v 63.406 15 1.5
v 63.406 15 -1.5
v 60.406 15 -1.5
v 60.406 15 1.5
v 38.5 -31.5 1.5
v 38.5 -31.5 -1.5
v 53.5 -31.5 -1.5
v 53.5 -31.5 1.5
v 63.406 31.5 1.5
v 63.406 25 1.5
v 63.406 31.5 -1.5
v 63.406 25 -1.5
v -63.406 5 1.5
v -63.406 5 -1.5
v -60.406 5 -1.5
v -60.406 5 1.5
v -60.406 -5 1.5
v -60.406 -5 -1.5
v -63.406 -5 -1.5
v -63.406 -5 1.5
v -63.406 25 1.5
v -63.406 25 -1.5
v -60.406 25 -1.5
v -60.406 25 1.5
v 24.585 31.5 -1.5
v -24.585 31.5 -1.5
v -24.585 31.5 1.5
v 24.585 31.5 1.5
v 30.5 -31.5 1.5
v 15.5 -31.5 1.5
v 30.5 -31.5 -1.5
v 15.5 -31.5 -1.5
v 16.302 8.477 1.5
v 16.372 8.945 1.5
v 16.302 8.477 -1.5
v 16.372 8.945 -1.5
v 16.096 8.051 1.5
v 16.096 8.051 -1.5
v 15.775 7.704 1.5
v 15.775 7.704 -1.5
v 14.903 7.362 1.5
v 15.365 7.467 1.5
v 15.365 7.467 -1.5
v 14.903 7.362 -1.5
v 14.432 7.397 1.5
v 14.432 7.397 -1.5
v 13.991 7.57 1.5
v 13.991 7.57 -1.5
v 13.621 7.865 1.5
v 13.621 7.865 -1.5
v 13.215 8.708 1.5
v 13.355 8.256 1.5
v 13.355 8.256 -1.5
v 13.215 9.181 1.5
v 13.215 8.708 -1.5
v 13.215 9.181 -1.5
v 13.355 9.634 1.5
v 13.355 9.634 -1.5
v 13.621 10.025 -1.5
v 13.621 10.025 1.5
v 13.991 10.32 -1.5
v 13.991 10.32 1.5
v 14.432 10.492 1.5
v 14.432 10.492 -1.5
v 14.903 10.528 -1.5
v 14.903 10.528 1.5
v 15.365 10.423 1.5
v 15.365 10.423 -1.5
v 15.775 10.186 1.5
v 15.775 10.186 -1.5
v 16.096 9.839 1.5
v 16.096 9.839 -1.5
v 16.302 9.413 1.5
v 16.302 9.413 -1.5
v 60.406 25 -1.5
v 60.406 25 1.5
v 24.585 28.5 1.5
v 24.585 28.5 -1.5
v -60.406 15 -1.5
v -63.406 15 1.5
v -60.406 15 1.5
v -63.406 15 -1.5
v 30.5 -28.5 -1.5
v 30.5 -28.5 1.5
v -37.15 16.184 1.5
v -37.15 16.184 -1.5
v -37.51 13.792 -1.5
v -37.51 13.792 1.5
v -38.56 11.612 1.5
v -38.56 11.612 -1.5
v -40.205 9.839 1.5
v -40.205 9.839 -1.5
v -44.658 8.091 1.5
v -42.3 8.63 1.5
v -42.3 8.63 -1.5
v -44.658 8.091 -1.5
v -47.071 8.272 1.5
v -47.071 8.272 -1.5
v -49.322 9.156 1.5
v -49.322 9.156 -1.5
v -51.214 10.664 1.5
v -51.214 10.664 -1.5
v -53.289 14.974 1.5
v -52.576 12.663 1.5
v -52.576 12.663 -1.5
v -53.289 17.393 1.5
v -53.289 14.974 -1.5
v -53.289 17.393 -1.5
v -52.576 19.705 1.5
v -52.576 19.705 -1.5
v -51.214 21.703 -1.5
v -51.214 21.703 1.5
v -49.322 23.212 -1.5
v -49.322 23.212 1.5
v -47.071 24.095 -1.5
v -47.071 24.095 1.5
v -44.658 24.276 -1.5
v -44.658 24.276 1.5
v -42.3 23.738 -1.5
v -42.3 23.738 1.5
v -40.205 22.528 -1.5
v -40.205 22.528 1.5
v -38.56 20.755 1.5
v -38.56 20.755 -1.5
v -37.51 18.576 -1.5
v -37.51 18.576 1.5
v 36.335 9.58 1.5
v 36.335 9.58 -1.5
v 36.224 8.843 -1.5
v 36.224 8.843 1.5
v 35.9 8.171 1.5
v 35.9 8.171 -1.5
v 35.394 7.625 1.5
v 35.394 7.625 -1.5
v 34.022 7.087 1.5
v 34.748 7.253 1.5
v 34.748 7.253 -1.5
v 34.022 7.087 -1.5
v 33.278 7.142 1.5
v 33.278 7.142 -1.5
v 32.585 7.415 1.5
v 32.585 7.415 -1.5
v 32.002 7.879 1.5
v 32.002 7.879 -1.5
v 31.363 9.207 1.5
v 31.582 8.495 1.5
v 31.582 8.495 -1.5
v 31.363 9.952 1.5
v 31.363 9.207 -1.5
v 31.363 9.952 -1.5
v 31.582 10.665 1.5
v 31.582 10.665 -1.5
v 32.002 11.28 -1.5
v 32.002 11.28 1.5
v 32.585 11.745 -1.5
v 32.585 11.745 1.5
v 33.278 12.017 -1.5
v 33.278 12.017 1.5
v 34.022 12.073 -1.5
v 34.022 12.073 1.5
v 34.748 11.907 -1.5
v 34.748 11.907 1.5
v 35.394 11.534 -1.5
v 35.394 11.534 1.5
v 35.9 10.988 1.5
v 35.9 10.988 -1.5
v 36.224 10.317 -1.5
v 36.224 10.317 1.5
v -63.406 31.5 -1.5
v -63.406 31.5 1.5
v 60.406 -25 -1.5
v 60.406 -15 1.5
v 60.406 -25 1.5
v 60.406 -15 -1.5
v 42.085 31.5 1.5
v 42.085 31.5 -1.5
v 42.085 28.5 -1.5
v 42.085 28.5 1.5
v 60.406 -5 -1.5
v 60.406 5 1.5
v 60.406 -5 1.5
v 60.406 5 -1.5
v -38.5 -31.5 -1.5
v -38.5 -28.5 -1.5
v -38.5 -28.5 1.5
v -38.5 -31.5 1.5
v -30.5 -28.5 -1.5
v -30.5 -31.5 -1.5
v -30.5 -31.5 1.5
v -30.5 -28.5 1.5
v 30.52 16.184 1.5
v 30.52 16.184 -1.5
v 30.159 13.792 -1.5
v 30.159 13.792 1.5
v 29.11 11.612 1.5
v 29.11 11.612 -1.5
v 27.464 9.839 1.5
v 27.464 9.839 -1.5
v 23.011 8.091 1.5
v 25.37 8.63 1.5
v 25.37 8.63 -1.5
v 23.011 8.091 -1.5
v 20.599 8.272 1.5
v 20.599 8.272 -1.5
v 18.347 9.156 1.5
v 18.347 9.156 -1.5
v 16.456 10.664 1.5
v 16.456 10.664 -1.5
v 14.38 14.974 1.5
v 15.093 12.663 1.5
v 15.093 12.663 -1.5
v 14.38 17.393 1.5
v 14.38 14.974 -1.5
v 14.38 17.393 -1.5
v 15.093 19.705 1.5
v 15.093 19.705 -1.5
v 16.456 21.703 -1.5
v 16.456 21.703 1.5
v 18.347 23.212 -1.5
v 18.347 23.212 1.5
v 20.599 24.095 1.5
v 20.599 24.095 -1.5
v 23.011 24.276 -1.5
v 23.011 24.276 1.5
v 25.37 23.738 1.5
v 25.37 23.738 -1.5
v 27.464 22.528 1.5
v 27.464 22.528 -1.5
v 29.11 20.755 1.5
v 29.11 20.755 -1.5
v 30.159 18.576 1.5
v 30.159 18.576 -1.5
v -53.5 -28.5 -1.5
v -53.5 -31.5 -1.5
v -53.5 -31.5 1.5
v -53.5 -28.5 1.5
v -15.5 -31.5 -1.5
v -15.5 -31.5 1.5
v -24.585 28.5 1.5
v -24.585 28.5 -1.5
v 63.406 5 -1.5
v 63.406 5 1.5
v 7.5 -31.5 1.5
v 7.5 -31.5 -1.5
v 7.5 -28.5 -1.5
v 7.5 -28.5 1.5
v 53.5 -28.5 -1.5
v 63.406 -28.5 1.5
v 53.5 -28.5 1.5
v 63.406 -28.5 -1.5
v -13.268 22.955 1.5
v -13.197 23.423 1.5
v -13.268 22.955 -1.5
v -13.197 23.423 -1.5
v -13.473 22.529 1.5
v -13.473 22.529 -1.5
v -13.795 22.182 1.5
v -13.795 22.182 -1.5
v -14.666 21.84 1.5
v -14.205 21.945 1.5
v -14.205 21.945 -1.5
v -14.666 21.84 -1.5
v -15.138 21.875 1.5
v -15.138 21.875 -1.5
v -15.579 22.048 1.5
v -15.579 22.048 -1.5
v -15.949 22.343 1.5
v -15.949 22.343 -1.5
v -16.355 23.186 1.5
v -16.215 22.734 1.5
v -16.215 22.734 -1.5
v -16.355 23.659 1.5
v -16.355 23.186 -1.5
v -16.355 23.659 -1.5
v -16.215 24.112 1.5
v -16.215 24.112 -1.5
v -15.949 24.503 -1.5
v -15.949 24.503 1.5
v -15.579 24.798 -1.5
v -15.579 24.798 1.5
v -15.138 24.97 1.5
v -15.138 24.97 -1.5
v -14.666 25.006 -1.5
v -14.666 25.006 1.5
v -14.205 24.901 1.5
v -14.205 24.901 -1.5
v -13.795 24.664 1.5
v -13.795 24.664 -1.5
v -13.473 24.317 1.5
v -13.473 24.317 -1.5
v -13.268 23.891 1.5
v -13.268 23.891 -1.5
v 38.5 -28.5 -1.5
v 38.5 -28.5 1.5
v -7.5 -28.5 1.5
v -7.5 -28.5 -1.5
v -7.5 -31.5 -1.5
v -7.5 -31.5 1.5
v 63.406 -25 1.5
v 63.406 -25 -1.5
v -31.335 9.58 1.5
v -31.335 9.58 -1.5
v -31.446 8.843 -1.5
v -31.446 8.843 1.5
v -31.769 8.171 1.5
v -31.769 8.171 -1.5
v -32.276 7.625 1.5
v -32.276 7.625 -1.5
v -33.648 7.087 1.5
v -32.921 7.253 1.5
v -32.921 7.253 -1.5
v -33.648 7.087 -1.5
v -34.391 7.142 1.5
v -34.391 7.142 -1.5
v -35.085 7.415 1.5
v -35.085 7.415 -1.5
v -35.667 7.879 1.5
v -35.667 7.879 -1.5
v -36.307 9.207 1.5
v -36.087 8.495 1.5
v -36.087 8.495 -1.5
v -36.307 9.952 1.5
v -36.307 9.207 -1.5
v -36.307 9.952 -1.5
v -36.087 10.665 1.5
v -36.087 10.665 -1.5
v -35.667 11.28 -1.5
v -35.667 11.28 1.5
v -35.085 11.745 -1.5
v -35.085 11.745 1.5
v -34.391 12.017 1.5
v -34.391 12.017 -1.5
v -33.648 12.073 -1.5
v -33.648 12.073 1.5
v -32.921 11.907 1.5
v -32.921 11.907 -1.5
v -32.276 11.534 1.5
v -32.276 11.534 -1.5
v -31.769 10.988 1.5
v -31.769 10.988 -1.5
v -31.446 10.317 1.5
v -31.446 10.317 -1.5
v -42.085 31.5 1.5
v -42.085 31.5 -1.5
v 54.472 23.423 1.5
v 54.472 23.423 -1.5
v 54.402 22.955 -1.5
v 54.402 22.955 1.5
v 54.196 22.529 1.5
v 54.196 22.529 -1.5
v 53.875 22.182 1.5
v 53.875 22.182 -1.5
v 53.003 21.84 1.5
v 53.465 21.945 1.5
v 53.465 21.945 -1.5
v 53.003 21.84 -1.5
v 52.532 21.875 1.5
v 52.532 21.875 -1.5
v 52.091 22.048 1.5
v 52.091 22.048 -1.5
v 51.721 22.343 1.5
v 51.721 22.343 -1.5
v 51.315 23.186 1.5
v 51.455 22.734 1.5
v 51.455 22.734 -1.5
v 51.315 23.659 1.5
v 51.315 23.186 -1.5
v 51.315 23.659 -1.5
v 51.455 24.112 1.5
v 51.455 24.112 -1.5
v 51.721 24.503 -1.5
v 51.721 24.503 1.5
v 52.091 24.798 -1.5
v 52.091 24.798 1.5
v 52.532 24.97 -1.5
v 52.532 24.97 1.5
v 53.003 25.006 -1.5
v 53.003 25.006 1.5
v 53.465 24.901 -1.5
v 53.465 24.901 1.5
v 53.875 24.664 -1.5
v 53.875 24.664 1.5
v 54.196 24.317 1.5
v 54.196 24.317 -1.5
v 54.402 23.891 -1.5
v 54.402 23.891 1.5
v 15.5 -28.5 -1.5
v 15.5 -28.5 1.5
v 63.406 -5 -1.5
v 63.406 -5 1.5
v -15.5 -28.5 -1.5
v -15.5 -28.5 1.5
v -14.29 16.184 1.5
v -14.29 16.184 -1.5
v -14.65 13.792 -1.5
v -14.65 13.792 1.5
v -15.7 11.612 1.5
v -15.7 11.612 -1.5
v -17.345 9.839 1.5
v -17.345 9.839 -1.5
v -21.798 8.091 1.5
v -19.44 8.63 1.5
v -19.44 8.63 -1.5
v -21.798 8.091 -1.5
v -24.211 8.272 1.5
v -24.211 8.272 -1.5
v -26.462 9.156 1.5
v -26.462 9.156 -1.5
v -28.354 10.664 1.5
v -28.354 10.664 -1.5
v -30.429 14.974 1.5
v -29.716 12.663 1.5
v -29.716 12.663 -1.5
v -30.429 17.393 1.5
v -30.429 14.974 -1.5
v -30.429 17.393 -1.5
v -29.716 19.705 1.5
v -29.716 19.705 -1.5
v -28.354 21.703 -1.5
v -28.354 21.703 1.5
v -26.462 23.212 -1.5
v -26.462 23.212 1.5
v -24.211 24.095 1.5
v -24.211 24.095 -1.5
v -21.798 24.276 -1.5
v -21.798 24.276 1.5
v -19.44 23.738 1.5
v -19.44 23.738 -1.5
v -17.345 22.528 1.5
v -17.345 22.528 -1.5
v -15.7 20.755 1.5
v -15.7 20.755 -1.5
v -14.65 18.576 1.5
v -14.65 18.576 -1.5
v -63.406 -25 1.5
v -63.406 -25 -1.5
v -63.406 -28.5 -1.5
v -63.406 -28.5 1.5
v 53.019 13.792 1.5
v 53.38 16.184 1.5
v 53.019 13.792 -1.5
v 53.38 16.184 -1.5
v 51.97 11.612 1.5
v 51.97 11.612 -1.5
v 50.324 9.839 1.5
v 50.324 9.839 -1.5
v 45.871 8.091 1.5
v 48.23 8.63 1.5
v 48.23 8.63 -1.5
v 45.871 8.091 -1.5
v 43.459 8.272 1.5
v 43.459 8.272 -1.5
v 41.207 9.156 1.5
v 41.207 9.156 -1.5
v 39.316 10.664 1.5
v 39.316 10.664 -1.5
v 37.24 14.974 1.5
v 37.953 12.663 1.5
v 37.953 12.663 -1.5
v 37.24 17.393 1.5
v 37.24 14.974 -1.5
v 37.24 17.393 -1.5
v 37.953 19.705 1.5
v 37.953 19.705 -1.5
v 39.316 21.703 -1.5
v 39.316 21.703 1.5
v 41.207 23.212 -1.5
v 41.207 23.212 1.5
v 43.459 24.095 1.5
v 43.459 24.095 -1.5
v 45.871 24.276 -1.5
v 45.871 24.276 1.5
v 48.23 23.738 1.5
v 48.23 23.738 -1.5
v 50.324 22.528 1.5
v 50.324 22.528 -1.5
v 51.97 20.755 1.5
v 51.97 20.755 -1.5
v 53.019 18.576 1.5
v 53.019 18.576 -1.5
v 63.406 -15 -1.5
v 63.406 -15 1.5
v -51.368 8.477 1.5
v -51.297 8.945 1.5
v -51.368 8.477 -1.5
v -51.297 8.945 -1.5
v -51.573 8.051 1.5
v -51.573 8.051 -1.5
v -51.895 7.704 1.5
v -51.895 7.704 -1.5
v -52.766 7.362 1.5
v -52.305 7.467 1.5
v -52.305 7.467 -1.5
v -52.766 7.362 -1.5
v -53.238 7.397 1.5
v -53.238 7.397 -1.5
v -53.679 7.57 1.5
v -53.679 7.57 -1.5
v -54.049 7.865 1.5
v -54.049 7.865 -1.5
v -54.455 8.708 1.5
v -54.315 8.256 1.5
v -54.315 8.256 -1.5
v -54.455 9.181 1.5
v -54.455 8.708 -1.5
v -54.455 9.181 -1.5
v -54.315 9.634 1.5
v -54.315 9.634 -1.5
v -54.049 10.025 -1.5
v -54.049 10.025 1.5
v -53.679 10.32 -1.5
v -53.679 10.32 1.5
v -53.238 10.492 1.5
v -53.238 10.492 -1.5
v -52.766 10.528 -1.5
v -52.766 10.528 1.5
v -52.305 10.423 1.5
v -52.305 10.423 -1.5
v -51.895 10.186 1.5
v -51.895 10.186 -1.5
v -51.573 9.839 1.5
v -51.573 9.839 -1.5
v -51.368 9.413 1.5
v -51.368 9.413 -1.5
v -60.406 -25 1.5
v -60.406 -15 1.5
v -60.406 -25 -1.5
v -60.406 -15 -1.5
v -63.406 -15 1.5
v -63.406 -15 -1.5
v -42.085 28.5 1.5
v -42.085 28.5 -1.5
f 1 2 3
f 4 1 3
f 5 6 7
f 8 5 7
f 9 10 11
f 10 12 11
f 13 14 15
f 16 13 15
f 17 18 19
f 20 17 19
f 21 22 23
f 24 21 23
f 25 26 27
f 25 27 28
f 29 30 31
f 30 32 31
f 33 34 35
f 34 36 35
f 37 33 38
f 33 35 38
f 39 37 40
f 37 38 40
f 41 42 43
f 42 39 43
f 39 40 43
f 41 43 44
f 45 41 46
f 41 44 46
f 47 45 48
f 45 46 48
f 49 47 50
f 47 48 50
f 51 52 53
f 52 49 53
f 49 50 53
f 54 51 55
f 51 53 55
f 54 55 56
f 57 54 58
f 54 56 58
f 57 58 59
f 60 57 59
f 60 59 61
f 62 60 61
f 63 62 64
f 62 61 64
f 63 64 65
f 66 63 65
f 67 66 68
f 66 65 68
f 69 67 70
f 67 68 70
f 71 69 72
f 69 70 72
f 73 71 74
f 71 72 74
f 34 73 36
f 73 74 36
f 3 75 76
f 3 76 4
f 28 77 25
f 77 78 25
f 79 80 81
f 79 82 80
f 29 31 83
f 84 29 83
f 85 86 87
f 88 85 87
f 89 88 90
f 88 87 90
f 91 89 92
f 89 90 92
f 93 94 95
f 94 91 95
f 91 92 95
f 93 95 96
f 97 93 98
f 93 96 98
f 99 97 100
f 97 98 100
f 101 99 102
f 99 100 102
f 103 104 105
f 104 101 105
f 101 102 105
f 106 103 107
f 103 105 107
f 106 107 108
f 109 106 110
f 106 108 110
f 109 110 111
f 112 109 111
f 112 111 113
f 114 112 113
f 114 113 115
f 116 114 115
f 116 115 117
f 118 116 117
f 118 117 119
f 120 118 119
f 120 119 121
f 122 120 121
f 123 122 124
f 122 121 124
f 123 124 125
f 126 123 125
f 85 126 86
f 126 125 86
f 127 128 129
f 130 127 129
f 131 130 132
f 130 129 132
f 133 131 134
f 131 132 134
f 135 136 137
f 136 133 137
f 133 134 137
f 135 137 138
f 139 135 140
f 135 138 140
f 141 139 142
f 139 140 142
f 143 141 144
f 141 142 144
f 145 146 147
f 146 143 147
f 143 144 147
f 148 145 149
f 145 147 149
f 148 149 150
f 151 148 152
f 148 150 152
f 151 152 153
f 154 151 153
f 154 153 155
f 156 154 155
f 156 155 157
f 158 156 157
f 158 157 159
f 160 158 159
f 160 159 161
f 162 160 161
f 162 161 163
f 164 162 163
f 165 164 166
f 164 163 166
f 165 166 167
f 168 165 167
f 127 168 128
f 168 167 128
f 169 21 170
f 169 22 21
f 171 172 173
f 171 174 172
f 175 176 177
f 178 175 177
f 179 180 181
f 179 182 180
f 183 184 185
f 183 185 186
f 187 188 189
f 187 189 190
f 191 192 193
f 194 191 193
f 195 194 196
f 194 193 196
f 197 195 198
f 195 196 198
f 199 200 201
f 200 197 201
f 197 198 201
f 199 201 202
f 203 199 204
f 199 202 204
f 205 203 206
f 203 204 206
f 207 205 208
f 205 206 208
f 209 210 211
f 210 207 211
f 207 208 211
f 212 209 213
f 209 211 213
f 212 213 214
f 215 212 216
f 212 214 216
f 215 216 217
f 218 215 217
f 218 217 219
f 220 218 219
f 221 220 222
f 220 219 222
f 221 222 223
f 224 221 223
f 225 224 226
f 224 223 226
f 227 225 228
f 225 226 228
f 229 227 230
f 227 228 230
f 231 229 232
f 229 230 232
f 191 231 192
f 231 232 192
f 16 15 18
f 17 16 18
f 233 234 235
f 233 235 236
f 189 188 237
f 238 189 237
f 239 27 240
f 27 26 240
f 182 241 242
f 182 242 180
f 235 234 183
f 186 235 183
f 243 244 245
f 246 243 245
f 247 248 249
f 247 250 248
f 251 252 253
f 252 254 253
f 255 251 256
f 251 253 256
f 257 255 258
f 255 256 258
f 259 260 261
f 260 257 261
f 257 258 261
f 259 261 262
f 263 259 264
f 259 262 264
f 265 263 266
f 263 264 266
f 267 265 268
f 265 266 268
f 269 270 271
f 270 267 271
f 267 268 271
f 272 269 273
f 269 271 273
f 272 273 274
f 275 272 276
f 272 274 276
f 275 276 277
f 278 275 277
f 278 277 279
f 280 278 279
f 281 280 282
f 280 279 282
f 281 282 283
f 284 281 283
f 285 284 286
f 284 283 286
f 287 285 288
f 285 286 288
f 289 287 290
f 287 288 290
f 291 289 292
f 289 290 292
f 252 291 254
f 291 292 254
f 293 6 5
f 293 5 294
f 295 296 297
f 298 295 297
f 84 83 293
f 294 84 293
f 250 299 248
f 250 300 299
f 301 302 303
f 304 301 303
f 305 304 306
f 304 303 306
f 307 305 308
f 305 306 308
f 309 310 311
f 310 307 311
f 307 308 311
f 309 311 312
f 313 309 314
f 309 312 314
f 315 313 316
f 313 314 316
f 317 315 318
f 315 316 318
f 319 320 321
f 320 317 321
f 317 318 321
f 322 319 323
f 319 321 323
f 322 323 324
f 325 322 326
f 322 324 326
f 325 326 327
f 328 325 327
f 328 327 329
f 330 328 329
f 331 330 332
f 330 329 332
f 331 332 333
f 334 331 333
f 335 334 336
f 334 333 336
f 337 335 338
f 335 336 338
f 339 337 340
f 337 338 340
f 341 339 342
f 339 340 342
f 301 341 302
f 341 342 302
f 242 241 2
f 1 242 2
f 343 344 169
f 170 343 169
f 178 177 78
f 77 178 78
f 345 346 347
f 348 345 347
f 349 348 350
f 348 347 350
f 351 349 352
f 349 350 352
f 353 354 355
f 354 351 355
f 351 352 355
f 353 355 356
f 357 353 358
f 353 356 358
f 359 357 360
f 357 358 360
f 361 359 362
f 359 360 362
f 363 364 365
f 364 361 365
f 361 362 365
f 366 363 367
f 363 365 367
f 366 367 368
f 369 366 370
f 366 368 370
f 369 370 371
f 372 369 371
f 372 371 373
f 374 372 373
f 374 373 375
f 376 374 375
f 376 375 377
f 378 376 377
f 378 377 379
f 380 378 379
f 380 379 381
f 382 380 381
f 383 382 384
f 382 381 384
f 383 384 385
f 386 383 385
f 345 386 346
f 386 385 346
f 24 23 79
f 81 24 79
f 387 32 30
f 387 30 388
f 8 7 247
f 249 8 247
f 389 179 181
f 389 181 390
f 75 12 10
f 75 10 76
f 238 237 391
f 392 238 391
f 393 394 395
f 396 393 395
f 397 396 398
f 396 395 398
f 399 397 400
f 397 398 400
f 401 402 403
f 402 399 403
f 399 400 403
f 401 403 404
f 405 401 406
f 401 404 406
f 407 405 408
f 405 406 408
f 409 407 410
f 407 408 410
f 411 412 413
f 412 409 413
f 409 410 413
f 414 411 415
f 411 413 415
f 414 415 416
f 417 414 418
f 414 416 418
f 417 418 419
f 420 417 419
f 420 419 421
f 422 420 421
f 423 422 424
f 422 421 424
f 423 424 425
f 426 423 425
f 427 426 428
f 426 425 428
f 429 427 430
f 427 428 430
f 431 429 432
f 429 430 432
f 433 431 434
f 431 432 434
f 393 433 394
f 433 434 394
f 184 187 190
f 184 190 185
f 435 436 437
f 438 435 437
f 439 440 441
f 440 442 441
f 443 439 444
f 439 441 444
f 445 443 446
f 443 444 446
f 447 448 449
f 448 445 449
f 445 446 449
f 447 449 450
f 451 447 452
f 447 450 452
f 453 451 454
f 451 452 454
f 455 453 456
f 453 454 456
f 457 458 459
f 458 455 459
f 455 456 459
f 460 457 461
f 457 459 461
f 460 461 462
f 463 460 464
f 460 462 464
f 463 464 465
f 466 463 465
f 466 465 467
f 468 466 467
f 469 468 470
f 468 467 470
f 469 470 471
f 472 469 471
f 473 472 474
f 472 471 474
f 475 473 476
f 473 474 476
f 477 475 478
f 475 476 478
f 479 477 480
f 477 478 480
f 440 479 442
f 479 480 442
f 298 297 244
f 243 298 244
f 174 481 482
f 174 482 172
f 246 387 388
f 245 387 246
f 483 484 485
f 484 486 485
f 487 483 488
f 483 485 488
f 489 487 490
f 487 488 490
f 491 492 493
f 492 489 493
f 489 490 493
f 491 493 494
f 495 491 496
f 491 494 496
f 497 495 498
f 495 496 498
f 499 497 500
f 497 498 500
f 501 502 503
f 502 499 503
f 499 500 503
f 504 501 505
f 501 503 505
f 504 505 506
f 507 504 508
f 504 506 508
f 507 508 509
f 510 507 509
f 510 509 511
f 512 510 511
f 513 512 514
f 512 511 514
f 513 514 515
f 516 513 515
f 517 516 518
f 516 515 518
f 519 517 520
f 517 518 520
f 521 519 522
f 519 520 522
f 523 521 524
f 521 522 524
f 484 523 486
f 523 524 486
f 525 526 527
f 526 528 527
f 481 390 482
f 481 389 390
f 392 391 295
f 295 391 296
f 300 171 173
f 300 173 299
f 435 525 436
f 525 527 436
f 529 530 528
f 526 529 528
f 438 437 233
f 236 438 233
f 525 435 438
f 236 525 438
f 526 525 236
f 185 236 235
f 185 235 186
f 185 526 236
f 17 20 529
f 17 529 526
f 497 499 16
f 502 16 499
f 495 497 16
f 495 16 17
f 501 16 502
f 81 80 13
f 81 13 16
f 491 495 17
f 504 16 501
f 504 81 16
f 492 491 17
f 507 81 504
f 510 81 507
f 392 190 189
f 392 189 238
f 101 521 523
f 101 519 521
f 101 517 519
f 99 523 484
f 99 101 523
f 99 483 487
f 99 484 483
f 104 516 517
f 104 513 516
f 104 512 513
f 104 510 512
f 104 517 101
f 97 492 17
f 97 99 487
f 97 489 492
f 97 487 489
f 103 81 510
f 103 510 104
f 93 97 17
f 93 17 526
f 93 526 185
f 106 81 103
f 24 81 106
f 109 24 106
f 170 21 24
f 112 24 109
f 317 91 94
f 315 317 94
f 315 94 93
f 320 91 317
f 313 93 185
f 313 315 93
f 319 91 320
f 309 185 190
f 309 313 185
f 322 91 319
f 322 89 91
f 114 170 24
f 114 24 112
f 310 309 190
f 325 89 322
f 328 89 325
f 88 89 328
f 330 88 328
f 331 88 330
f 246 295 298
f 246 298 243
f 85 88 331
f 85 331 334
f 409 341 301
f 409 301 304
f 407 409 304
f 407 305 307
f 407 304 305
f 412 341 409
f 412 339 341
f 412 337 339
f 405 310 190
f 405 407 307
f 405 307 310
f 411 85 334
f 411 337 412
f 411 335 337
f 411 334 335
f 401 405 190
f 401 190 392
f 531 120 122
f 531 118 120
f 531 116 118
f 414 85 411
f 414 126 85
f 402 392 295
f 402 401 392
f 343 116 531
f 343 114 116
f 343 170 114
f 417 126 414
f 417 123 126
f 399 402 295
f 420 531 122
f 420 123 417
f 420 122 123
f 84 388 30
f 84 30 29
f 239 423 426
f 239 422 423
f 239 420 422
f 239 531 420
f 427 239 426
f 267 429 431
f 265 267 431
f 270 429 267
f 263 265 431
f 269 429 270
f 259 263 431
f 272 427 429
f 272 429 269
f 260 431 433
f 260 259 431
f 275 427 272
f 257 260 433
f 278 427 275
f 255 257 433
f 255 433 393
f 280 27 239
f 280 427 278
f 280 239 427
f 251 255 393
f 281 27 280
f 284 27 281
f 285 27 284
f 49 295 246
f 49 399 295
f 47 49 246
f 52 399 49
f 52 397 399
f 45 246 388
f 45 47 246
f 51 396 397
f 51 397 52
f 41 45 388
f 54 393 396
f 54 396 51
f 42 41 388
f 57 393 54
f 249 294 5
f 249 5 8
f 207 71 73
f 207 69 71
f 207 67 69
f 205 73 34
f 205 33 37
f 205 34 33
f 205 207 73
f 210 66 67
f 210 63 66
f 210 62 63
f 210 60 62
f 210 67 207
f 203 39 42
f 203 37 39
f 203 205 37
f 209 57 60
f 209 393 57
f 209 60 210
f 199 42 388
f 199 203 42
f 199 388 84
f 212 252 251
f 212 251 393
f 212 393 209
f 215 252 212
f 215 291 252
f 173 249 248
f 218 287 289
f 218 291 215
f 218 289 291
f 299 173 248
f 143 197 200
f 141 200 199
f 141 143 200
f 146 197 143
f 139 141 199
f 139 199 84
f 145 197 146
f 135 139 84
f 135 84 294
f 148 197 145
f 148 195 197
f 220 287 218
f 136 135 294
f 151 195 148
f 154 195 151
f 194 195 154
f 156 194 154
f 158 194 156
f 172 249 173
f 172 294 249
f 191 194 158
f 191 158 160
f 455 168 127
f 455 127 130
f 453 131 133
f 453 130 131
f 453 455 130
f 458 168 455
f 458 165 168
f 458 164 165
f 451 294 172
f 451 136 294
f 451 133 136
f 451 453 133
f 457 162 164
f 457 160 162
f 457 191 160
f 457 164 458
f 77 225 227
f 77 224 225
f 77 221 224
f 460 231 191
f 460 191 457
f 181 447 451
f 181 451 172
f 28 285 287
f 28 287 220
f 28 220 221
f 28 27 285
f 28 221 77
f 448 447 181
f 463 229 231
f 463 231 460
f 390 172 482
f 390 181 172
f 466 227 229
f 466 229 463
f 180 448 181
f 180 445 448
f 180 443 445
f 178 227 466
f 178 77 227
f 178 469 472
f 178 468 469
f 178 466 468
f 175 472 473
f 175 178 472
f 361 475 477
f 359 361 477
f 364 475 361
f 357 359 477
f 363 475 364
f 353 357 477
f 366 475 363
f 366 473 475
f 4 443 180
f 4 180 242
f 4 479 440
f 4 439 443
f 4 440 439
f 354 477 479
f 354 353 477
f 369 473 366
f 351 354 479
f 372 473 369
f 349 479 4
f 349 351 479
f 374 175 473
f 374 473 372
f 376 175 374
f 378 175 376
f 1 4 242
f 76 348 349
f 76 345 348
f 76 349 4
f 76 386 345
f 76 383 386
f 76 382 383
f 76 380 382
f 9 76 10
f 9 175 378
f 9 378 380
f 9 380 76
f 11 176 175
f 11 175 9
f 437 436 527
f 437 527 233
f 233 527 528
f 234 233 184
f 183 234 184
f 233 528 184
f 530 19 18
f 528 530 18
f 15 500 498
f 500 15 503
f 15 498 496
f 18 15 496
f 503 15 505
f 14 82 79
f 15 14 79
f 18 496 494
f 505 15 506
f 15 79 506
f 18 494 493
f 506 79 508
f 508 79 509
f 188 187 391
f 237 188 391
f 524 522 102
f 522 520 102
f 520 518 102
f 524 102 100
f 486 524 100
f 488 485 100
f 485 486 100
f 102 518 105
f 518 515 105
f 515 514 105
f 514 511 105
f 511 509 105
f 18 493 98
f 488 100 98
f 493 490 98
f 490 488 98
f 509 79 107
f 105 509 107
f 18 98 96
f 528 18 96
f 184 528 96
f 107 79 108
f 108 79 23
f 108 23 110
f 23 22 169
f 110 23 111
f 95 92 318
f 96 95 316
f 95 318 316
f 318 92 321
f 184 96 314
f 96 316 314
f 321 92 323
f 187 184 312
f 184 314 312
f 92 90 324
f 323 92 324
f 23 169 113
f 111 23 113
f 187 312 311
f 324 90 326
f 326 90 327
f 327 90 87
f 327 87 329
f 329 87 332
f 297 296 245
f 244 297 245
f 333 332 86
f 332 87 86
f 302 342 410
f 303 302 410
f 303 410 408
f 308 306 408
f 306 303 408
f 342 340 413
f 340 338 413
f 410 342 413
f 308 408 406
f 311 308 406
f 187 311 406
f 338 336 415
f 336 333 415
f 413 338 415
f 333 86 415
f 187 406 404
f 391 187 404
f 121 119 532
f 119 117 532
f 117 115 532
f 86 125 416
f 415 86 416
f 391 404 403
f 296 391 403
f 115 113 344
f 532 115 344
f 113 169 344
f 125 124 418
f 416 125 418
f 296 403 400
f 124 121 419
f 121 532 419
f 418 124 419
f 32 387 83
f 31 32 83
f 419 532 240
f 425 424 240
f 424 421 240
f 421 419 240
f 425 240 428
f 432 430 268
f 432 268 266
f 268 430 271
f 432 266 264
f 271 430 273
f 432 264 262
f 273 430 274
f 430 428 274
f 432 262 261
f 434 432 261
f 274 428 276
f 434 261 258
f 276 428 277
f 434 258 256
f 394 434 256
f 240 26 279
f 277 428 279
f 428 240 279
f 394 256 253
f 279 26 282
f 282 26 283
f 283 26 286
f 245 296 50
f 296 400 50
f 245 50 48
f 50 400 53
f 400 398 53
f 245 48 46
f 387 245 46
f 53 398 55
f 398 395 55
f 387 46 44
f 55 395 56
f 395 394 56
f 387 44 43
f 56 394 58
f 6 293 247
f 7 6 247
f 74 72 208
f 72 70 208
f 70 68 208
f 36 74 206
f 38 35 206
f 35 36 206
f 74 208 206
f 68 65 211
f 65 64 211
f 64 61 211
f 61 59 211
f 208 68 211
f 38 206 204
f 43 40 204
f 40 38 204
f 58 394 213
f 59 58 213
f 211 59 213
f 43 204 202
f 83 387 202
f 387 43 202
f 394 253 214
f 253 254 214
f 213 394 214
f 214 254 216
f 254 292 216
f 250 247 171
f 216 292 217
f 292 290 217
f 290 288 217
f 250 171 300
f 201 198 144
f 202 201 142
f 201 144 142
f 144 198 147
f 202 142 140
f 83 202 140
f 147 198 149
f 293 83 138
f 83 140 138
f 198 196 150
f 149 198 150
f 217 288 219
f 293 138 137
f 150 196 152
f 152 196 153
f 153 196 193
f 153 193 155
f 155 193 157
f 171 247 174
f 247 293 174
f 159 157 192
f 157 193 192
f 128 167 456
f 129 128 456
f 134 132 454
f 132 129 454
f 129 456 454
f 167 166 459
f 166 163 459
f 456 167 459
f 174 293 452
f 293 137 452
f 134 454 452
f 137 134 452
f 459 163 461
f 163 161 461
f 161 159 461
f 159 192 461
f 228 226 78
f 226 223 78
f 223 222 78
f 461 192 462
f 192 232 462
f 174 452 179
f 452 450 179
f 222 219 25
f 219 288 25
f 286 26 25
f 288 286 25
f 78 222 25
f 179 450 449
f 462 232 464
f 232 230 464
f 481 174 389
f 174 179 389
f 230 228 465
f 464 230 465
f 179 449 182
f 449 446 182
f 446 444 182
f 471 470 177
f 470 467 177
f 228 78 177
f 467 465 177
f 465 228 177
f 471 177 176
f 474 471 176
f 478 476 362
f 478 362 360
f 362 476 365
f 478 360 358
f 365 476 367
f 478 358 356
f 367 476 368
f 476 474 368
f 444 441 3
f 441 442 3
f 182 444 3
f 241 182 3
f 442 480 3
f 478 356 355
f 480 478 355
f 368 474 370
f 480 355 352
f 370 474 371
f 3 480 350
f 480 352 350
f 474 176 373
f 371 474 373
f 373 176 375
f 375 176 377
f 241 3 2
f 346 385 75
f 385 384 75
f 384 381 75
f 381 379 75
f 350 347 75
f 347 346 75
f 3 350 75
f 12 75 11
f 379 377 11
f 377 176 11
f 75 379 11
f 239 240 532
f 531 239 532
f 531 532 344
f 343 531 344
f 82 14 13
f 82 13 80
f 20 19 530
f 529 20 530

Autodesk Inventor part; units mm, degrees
ref_plane "YZ Plane" through (0, 0, 0) normal (1, 0, 0) x (0, 1, 0)
ref_plane "XZ Plane" through (0, 0, 0) normal (0, 1, 0) x (-1, 0, 0)
ref_plane "XY Plane" through (0, 0, 0) normal (0, 0, 1) x (1, 0, 0)
sketch "Sketch1" plane through (0, 0, 0) normal (0, 0, 1) x (1, 0, 0)
  line L0 (-42.0848, 28.5) -> (-42.0848, 31.5)
  line L1 (-24.5848, 28.5) -> (-42.0848, 28.5)
  line L2 (-24.5848, 31.5) -> (-24.5848, 28.5)
  line L3 (-24.5848, 31.5) -> (24.5848, 31.5)
  line L4 (24.5848, 28.5) -> (24.5848, 31.5)
  line L5 (42.0848, 28.5) -> (24.5848, 28.5)
  line L6 (42.0848, 31.5) -> (42.0848, 28.5)
  circle A0 centre (-45.2648, 16.1838) radius 8.115
  circle A1 centre (-22.4048, 16.1838) radius 8.115
  circle A2 centre (-14.7848, 23.4228) radius 1.5875
  circle A3 centre (-52.8848, 8.9448) radius 1.5875
  circle A4 centre (-33.8348, 9.5798) radius 2.5
  circle A5 centre (14.7848, 8.9448) radius 1.5875
  circle A6 centre (22.4048, 16.1838) radius 8.115
  circle A7 centre (33.8348, 9.5798) radius 2.5
  circle A8 centre (45.2648, 16.1838) radius 8.115
  circle A9 centre (52.8848, 23.4228) radius 1.5875
  line L7 (-60.406, 31.5) -> (60.406, -31.5) construction
  line L8 (60.406, 31.5) -> (-60.406, -31.5) construction
  line L9 (-7.5, -31.5) -> (7.5, -31.5)
  line L10 (7.5, -31.5) -> (7.5, -28.5)
  line L11 (-7.5, -28.5) -> (-7.5, -31.5)
  line L12 (-7.5, -31.5) -> (7.5, -28.5) construction
  line L13 (7.5, -31.5) -> (-7.5, -28.5) construction
  line L14 (0, 0) -> (13.8, 0) construction
  line L15 (13.8, 0) -> (13.8, 4) construction
  line L16 (-30.5, -31.5) -> (-15.5, -31.5)
  line L17 (-53.5, -31.5) -> (-38.5, -31.5)
  line L18 (15.5, -31.5) -> (30.5, -31.5)
  line L19 (-7.5, -31.5) -> (7.5, -31.5)
  line L20 (-30.5, -31.5) -> (-15.5, -31.5)
  line L21 (38.5, -31.5) -> (53.5, -31.5)
  line L22 (15.5, -31.5) -> (30.5, -31.5)
  line L23 (-7.5, -31.5) -> (7.5, -31.5)
  line L24 (-15.5, -31.5) -> (-15.5, -28.5)
  line L25 (-15.5, -28.5) -> (-7.5, -28.5)
  line L26 (-30.5, -31.5) -> (-30.5, -28.5)
  line L27 (-30.5, -28.5) -> (-38.5, -28.5)
  line L28 (-38.5, -28.5) -> (-38.5, -31.5)
  line L29 (-53.5, -31.5) -> (-53.5, -28.5)
  line L30 (15.5, -31.5) -> (15.5, -28.5)
  line L31 (15.5, -28.5) -> (7.5, -28.5)
  line L32 (30.5, -31.5) -> (30.5, -28.5)
  line L33 (30.5, -28.5) -> (38.5, -28.5)
  line L34 (38.5, -31.5) -> (38.5, -28.5)
  line L35 (53.5, -31.5) -> (53.5, -28.5)
  line L36 (-60.4057, -31.5) -> (-60.4057, -31.4998)
  line L37 (-63.4057, 5) -> (-63.4057, 15)
  line L38 (-63.4057, -5) -> (-63.4057, -15)
  line L39 (-63.4057, -25) -> (-63.4057, -28.5)
  line L40 (-63.4057, 25) -> (-63.4057, 31.5)
  line L41 (-42.0848, 31.5) -> (-63.4057, 31.5)
  line L42 (-63.4057, 25) -> (-60.4057, 25)
  line L43 (-60.4057, 25) -> (-60.4057, 15)
  line L44 (-63.4057, 15) -> (-60.4057, 15)
  line L45 (-63.4057, 5) -> (-60.4057, 5)
  line L46 (-60.4057, 5) -> (-60.4057, -5)
  line L47 (-60.4057, -5) -> (-63.4057, -5)
  line L48 (-63.4057, -15) -> (-60.4057, -15)
  line L49 (-60.4057, -15) -> (-60.4057, -25)
  line L50 (-60.4057, -25) -> (-63.4057, -25)
  line L51 (-63.4057, -28.5) -> (-53.5, -28.5)
  line L52 (0, 0) -> (0, 18) construction
  line L53 (60.4057, -31.5) -> (60.4057, -31.4998)
  line L54 (63.4057, 5) -> (63.4057, 15)
  line L55 (63.4057, -5) -> (63.4057, -15)
  line L56 (63.4057, -25) -> (63.4057, -28.5)
  line L57 (63.4057, 25) -> (63.4057, 31.5)
  line L58 (42.0848, 31.5) -> (63.4057, 31.5)
  line L59 (63.4057, 25) -> (60.4057, 25)
  line L60 (60.4057, 25) -> (60.4057, 15)
  line L61 (63.4057, 15) -> (60.4057, 15)
  line L62 (63.4057, 5) -> (60.4057, 5)
  line L63 (60.4057, 5) -> (60.4057, -5)
  line L64 (60.4057, -5) -> (63.4057, -5)
  line L65 (63.4057, -15) -> (60.4057, -15)
  line L66 (60.4057, -15) -> (60.4057, -25)
  line L67 (60.4057, -25) -> (63.4057, -25)
  line L68 (63.4057, -28.5) -> (53.5, -28.5)
  point P0 (0, 0)
  point P1 (0, -30)
  dimension "d0" = 15
  dimension "d1" = 3
  dimension "d5" = 23
  dimension "d8" = 23
  dimension "d11" = 3
  dimension "d12" = 3
  dimension "d13" = 90
  dimension "d14" = 3
  dimension "d17" = 3
  dimension "d18" = 10
  dimension "d20" = 10
extrude "Extrusion1" add sketch "Sketch1" along normal mid plane 3
properties part number "srfbelakang"
